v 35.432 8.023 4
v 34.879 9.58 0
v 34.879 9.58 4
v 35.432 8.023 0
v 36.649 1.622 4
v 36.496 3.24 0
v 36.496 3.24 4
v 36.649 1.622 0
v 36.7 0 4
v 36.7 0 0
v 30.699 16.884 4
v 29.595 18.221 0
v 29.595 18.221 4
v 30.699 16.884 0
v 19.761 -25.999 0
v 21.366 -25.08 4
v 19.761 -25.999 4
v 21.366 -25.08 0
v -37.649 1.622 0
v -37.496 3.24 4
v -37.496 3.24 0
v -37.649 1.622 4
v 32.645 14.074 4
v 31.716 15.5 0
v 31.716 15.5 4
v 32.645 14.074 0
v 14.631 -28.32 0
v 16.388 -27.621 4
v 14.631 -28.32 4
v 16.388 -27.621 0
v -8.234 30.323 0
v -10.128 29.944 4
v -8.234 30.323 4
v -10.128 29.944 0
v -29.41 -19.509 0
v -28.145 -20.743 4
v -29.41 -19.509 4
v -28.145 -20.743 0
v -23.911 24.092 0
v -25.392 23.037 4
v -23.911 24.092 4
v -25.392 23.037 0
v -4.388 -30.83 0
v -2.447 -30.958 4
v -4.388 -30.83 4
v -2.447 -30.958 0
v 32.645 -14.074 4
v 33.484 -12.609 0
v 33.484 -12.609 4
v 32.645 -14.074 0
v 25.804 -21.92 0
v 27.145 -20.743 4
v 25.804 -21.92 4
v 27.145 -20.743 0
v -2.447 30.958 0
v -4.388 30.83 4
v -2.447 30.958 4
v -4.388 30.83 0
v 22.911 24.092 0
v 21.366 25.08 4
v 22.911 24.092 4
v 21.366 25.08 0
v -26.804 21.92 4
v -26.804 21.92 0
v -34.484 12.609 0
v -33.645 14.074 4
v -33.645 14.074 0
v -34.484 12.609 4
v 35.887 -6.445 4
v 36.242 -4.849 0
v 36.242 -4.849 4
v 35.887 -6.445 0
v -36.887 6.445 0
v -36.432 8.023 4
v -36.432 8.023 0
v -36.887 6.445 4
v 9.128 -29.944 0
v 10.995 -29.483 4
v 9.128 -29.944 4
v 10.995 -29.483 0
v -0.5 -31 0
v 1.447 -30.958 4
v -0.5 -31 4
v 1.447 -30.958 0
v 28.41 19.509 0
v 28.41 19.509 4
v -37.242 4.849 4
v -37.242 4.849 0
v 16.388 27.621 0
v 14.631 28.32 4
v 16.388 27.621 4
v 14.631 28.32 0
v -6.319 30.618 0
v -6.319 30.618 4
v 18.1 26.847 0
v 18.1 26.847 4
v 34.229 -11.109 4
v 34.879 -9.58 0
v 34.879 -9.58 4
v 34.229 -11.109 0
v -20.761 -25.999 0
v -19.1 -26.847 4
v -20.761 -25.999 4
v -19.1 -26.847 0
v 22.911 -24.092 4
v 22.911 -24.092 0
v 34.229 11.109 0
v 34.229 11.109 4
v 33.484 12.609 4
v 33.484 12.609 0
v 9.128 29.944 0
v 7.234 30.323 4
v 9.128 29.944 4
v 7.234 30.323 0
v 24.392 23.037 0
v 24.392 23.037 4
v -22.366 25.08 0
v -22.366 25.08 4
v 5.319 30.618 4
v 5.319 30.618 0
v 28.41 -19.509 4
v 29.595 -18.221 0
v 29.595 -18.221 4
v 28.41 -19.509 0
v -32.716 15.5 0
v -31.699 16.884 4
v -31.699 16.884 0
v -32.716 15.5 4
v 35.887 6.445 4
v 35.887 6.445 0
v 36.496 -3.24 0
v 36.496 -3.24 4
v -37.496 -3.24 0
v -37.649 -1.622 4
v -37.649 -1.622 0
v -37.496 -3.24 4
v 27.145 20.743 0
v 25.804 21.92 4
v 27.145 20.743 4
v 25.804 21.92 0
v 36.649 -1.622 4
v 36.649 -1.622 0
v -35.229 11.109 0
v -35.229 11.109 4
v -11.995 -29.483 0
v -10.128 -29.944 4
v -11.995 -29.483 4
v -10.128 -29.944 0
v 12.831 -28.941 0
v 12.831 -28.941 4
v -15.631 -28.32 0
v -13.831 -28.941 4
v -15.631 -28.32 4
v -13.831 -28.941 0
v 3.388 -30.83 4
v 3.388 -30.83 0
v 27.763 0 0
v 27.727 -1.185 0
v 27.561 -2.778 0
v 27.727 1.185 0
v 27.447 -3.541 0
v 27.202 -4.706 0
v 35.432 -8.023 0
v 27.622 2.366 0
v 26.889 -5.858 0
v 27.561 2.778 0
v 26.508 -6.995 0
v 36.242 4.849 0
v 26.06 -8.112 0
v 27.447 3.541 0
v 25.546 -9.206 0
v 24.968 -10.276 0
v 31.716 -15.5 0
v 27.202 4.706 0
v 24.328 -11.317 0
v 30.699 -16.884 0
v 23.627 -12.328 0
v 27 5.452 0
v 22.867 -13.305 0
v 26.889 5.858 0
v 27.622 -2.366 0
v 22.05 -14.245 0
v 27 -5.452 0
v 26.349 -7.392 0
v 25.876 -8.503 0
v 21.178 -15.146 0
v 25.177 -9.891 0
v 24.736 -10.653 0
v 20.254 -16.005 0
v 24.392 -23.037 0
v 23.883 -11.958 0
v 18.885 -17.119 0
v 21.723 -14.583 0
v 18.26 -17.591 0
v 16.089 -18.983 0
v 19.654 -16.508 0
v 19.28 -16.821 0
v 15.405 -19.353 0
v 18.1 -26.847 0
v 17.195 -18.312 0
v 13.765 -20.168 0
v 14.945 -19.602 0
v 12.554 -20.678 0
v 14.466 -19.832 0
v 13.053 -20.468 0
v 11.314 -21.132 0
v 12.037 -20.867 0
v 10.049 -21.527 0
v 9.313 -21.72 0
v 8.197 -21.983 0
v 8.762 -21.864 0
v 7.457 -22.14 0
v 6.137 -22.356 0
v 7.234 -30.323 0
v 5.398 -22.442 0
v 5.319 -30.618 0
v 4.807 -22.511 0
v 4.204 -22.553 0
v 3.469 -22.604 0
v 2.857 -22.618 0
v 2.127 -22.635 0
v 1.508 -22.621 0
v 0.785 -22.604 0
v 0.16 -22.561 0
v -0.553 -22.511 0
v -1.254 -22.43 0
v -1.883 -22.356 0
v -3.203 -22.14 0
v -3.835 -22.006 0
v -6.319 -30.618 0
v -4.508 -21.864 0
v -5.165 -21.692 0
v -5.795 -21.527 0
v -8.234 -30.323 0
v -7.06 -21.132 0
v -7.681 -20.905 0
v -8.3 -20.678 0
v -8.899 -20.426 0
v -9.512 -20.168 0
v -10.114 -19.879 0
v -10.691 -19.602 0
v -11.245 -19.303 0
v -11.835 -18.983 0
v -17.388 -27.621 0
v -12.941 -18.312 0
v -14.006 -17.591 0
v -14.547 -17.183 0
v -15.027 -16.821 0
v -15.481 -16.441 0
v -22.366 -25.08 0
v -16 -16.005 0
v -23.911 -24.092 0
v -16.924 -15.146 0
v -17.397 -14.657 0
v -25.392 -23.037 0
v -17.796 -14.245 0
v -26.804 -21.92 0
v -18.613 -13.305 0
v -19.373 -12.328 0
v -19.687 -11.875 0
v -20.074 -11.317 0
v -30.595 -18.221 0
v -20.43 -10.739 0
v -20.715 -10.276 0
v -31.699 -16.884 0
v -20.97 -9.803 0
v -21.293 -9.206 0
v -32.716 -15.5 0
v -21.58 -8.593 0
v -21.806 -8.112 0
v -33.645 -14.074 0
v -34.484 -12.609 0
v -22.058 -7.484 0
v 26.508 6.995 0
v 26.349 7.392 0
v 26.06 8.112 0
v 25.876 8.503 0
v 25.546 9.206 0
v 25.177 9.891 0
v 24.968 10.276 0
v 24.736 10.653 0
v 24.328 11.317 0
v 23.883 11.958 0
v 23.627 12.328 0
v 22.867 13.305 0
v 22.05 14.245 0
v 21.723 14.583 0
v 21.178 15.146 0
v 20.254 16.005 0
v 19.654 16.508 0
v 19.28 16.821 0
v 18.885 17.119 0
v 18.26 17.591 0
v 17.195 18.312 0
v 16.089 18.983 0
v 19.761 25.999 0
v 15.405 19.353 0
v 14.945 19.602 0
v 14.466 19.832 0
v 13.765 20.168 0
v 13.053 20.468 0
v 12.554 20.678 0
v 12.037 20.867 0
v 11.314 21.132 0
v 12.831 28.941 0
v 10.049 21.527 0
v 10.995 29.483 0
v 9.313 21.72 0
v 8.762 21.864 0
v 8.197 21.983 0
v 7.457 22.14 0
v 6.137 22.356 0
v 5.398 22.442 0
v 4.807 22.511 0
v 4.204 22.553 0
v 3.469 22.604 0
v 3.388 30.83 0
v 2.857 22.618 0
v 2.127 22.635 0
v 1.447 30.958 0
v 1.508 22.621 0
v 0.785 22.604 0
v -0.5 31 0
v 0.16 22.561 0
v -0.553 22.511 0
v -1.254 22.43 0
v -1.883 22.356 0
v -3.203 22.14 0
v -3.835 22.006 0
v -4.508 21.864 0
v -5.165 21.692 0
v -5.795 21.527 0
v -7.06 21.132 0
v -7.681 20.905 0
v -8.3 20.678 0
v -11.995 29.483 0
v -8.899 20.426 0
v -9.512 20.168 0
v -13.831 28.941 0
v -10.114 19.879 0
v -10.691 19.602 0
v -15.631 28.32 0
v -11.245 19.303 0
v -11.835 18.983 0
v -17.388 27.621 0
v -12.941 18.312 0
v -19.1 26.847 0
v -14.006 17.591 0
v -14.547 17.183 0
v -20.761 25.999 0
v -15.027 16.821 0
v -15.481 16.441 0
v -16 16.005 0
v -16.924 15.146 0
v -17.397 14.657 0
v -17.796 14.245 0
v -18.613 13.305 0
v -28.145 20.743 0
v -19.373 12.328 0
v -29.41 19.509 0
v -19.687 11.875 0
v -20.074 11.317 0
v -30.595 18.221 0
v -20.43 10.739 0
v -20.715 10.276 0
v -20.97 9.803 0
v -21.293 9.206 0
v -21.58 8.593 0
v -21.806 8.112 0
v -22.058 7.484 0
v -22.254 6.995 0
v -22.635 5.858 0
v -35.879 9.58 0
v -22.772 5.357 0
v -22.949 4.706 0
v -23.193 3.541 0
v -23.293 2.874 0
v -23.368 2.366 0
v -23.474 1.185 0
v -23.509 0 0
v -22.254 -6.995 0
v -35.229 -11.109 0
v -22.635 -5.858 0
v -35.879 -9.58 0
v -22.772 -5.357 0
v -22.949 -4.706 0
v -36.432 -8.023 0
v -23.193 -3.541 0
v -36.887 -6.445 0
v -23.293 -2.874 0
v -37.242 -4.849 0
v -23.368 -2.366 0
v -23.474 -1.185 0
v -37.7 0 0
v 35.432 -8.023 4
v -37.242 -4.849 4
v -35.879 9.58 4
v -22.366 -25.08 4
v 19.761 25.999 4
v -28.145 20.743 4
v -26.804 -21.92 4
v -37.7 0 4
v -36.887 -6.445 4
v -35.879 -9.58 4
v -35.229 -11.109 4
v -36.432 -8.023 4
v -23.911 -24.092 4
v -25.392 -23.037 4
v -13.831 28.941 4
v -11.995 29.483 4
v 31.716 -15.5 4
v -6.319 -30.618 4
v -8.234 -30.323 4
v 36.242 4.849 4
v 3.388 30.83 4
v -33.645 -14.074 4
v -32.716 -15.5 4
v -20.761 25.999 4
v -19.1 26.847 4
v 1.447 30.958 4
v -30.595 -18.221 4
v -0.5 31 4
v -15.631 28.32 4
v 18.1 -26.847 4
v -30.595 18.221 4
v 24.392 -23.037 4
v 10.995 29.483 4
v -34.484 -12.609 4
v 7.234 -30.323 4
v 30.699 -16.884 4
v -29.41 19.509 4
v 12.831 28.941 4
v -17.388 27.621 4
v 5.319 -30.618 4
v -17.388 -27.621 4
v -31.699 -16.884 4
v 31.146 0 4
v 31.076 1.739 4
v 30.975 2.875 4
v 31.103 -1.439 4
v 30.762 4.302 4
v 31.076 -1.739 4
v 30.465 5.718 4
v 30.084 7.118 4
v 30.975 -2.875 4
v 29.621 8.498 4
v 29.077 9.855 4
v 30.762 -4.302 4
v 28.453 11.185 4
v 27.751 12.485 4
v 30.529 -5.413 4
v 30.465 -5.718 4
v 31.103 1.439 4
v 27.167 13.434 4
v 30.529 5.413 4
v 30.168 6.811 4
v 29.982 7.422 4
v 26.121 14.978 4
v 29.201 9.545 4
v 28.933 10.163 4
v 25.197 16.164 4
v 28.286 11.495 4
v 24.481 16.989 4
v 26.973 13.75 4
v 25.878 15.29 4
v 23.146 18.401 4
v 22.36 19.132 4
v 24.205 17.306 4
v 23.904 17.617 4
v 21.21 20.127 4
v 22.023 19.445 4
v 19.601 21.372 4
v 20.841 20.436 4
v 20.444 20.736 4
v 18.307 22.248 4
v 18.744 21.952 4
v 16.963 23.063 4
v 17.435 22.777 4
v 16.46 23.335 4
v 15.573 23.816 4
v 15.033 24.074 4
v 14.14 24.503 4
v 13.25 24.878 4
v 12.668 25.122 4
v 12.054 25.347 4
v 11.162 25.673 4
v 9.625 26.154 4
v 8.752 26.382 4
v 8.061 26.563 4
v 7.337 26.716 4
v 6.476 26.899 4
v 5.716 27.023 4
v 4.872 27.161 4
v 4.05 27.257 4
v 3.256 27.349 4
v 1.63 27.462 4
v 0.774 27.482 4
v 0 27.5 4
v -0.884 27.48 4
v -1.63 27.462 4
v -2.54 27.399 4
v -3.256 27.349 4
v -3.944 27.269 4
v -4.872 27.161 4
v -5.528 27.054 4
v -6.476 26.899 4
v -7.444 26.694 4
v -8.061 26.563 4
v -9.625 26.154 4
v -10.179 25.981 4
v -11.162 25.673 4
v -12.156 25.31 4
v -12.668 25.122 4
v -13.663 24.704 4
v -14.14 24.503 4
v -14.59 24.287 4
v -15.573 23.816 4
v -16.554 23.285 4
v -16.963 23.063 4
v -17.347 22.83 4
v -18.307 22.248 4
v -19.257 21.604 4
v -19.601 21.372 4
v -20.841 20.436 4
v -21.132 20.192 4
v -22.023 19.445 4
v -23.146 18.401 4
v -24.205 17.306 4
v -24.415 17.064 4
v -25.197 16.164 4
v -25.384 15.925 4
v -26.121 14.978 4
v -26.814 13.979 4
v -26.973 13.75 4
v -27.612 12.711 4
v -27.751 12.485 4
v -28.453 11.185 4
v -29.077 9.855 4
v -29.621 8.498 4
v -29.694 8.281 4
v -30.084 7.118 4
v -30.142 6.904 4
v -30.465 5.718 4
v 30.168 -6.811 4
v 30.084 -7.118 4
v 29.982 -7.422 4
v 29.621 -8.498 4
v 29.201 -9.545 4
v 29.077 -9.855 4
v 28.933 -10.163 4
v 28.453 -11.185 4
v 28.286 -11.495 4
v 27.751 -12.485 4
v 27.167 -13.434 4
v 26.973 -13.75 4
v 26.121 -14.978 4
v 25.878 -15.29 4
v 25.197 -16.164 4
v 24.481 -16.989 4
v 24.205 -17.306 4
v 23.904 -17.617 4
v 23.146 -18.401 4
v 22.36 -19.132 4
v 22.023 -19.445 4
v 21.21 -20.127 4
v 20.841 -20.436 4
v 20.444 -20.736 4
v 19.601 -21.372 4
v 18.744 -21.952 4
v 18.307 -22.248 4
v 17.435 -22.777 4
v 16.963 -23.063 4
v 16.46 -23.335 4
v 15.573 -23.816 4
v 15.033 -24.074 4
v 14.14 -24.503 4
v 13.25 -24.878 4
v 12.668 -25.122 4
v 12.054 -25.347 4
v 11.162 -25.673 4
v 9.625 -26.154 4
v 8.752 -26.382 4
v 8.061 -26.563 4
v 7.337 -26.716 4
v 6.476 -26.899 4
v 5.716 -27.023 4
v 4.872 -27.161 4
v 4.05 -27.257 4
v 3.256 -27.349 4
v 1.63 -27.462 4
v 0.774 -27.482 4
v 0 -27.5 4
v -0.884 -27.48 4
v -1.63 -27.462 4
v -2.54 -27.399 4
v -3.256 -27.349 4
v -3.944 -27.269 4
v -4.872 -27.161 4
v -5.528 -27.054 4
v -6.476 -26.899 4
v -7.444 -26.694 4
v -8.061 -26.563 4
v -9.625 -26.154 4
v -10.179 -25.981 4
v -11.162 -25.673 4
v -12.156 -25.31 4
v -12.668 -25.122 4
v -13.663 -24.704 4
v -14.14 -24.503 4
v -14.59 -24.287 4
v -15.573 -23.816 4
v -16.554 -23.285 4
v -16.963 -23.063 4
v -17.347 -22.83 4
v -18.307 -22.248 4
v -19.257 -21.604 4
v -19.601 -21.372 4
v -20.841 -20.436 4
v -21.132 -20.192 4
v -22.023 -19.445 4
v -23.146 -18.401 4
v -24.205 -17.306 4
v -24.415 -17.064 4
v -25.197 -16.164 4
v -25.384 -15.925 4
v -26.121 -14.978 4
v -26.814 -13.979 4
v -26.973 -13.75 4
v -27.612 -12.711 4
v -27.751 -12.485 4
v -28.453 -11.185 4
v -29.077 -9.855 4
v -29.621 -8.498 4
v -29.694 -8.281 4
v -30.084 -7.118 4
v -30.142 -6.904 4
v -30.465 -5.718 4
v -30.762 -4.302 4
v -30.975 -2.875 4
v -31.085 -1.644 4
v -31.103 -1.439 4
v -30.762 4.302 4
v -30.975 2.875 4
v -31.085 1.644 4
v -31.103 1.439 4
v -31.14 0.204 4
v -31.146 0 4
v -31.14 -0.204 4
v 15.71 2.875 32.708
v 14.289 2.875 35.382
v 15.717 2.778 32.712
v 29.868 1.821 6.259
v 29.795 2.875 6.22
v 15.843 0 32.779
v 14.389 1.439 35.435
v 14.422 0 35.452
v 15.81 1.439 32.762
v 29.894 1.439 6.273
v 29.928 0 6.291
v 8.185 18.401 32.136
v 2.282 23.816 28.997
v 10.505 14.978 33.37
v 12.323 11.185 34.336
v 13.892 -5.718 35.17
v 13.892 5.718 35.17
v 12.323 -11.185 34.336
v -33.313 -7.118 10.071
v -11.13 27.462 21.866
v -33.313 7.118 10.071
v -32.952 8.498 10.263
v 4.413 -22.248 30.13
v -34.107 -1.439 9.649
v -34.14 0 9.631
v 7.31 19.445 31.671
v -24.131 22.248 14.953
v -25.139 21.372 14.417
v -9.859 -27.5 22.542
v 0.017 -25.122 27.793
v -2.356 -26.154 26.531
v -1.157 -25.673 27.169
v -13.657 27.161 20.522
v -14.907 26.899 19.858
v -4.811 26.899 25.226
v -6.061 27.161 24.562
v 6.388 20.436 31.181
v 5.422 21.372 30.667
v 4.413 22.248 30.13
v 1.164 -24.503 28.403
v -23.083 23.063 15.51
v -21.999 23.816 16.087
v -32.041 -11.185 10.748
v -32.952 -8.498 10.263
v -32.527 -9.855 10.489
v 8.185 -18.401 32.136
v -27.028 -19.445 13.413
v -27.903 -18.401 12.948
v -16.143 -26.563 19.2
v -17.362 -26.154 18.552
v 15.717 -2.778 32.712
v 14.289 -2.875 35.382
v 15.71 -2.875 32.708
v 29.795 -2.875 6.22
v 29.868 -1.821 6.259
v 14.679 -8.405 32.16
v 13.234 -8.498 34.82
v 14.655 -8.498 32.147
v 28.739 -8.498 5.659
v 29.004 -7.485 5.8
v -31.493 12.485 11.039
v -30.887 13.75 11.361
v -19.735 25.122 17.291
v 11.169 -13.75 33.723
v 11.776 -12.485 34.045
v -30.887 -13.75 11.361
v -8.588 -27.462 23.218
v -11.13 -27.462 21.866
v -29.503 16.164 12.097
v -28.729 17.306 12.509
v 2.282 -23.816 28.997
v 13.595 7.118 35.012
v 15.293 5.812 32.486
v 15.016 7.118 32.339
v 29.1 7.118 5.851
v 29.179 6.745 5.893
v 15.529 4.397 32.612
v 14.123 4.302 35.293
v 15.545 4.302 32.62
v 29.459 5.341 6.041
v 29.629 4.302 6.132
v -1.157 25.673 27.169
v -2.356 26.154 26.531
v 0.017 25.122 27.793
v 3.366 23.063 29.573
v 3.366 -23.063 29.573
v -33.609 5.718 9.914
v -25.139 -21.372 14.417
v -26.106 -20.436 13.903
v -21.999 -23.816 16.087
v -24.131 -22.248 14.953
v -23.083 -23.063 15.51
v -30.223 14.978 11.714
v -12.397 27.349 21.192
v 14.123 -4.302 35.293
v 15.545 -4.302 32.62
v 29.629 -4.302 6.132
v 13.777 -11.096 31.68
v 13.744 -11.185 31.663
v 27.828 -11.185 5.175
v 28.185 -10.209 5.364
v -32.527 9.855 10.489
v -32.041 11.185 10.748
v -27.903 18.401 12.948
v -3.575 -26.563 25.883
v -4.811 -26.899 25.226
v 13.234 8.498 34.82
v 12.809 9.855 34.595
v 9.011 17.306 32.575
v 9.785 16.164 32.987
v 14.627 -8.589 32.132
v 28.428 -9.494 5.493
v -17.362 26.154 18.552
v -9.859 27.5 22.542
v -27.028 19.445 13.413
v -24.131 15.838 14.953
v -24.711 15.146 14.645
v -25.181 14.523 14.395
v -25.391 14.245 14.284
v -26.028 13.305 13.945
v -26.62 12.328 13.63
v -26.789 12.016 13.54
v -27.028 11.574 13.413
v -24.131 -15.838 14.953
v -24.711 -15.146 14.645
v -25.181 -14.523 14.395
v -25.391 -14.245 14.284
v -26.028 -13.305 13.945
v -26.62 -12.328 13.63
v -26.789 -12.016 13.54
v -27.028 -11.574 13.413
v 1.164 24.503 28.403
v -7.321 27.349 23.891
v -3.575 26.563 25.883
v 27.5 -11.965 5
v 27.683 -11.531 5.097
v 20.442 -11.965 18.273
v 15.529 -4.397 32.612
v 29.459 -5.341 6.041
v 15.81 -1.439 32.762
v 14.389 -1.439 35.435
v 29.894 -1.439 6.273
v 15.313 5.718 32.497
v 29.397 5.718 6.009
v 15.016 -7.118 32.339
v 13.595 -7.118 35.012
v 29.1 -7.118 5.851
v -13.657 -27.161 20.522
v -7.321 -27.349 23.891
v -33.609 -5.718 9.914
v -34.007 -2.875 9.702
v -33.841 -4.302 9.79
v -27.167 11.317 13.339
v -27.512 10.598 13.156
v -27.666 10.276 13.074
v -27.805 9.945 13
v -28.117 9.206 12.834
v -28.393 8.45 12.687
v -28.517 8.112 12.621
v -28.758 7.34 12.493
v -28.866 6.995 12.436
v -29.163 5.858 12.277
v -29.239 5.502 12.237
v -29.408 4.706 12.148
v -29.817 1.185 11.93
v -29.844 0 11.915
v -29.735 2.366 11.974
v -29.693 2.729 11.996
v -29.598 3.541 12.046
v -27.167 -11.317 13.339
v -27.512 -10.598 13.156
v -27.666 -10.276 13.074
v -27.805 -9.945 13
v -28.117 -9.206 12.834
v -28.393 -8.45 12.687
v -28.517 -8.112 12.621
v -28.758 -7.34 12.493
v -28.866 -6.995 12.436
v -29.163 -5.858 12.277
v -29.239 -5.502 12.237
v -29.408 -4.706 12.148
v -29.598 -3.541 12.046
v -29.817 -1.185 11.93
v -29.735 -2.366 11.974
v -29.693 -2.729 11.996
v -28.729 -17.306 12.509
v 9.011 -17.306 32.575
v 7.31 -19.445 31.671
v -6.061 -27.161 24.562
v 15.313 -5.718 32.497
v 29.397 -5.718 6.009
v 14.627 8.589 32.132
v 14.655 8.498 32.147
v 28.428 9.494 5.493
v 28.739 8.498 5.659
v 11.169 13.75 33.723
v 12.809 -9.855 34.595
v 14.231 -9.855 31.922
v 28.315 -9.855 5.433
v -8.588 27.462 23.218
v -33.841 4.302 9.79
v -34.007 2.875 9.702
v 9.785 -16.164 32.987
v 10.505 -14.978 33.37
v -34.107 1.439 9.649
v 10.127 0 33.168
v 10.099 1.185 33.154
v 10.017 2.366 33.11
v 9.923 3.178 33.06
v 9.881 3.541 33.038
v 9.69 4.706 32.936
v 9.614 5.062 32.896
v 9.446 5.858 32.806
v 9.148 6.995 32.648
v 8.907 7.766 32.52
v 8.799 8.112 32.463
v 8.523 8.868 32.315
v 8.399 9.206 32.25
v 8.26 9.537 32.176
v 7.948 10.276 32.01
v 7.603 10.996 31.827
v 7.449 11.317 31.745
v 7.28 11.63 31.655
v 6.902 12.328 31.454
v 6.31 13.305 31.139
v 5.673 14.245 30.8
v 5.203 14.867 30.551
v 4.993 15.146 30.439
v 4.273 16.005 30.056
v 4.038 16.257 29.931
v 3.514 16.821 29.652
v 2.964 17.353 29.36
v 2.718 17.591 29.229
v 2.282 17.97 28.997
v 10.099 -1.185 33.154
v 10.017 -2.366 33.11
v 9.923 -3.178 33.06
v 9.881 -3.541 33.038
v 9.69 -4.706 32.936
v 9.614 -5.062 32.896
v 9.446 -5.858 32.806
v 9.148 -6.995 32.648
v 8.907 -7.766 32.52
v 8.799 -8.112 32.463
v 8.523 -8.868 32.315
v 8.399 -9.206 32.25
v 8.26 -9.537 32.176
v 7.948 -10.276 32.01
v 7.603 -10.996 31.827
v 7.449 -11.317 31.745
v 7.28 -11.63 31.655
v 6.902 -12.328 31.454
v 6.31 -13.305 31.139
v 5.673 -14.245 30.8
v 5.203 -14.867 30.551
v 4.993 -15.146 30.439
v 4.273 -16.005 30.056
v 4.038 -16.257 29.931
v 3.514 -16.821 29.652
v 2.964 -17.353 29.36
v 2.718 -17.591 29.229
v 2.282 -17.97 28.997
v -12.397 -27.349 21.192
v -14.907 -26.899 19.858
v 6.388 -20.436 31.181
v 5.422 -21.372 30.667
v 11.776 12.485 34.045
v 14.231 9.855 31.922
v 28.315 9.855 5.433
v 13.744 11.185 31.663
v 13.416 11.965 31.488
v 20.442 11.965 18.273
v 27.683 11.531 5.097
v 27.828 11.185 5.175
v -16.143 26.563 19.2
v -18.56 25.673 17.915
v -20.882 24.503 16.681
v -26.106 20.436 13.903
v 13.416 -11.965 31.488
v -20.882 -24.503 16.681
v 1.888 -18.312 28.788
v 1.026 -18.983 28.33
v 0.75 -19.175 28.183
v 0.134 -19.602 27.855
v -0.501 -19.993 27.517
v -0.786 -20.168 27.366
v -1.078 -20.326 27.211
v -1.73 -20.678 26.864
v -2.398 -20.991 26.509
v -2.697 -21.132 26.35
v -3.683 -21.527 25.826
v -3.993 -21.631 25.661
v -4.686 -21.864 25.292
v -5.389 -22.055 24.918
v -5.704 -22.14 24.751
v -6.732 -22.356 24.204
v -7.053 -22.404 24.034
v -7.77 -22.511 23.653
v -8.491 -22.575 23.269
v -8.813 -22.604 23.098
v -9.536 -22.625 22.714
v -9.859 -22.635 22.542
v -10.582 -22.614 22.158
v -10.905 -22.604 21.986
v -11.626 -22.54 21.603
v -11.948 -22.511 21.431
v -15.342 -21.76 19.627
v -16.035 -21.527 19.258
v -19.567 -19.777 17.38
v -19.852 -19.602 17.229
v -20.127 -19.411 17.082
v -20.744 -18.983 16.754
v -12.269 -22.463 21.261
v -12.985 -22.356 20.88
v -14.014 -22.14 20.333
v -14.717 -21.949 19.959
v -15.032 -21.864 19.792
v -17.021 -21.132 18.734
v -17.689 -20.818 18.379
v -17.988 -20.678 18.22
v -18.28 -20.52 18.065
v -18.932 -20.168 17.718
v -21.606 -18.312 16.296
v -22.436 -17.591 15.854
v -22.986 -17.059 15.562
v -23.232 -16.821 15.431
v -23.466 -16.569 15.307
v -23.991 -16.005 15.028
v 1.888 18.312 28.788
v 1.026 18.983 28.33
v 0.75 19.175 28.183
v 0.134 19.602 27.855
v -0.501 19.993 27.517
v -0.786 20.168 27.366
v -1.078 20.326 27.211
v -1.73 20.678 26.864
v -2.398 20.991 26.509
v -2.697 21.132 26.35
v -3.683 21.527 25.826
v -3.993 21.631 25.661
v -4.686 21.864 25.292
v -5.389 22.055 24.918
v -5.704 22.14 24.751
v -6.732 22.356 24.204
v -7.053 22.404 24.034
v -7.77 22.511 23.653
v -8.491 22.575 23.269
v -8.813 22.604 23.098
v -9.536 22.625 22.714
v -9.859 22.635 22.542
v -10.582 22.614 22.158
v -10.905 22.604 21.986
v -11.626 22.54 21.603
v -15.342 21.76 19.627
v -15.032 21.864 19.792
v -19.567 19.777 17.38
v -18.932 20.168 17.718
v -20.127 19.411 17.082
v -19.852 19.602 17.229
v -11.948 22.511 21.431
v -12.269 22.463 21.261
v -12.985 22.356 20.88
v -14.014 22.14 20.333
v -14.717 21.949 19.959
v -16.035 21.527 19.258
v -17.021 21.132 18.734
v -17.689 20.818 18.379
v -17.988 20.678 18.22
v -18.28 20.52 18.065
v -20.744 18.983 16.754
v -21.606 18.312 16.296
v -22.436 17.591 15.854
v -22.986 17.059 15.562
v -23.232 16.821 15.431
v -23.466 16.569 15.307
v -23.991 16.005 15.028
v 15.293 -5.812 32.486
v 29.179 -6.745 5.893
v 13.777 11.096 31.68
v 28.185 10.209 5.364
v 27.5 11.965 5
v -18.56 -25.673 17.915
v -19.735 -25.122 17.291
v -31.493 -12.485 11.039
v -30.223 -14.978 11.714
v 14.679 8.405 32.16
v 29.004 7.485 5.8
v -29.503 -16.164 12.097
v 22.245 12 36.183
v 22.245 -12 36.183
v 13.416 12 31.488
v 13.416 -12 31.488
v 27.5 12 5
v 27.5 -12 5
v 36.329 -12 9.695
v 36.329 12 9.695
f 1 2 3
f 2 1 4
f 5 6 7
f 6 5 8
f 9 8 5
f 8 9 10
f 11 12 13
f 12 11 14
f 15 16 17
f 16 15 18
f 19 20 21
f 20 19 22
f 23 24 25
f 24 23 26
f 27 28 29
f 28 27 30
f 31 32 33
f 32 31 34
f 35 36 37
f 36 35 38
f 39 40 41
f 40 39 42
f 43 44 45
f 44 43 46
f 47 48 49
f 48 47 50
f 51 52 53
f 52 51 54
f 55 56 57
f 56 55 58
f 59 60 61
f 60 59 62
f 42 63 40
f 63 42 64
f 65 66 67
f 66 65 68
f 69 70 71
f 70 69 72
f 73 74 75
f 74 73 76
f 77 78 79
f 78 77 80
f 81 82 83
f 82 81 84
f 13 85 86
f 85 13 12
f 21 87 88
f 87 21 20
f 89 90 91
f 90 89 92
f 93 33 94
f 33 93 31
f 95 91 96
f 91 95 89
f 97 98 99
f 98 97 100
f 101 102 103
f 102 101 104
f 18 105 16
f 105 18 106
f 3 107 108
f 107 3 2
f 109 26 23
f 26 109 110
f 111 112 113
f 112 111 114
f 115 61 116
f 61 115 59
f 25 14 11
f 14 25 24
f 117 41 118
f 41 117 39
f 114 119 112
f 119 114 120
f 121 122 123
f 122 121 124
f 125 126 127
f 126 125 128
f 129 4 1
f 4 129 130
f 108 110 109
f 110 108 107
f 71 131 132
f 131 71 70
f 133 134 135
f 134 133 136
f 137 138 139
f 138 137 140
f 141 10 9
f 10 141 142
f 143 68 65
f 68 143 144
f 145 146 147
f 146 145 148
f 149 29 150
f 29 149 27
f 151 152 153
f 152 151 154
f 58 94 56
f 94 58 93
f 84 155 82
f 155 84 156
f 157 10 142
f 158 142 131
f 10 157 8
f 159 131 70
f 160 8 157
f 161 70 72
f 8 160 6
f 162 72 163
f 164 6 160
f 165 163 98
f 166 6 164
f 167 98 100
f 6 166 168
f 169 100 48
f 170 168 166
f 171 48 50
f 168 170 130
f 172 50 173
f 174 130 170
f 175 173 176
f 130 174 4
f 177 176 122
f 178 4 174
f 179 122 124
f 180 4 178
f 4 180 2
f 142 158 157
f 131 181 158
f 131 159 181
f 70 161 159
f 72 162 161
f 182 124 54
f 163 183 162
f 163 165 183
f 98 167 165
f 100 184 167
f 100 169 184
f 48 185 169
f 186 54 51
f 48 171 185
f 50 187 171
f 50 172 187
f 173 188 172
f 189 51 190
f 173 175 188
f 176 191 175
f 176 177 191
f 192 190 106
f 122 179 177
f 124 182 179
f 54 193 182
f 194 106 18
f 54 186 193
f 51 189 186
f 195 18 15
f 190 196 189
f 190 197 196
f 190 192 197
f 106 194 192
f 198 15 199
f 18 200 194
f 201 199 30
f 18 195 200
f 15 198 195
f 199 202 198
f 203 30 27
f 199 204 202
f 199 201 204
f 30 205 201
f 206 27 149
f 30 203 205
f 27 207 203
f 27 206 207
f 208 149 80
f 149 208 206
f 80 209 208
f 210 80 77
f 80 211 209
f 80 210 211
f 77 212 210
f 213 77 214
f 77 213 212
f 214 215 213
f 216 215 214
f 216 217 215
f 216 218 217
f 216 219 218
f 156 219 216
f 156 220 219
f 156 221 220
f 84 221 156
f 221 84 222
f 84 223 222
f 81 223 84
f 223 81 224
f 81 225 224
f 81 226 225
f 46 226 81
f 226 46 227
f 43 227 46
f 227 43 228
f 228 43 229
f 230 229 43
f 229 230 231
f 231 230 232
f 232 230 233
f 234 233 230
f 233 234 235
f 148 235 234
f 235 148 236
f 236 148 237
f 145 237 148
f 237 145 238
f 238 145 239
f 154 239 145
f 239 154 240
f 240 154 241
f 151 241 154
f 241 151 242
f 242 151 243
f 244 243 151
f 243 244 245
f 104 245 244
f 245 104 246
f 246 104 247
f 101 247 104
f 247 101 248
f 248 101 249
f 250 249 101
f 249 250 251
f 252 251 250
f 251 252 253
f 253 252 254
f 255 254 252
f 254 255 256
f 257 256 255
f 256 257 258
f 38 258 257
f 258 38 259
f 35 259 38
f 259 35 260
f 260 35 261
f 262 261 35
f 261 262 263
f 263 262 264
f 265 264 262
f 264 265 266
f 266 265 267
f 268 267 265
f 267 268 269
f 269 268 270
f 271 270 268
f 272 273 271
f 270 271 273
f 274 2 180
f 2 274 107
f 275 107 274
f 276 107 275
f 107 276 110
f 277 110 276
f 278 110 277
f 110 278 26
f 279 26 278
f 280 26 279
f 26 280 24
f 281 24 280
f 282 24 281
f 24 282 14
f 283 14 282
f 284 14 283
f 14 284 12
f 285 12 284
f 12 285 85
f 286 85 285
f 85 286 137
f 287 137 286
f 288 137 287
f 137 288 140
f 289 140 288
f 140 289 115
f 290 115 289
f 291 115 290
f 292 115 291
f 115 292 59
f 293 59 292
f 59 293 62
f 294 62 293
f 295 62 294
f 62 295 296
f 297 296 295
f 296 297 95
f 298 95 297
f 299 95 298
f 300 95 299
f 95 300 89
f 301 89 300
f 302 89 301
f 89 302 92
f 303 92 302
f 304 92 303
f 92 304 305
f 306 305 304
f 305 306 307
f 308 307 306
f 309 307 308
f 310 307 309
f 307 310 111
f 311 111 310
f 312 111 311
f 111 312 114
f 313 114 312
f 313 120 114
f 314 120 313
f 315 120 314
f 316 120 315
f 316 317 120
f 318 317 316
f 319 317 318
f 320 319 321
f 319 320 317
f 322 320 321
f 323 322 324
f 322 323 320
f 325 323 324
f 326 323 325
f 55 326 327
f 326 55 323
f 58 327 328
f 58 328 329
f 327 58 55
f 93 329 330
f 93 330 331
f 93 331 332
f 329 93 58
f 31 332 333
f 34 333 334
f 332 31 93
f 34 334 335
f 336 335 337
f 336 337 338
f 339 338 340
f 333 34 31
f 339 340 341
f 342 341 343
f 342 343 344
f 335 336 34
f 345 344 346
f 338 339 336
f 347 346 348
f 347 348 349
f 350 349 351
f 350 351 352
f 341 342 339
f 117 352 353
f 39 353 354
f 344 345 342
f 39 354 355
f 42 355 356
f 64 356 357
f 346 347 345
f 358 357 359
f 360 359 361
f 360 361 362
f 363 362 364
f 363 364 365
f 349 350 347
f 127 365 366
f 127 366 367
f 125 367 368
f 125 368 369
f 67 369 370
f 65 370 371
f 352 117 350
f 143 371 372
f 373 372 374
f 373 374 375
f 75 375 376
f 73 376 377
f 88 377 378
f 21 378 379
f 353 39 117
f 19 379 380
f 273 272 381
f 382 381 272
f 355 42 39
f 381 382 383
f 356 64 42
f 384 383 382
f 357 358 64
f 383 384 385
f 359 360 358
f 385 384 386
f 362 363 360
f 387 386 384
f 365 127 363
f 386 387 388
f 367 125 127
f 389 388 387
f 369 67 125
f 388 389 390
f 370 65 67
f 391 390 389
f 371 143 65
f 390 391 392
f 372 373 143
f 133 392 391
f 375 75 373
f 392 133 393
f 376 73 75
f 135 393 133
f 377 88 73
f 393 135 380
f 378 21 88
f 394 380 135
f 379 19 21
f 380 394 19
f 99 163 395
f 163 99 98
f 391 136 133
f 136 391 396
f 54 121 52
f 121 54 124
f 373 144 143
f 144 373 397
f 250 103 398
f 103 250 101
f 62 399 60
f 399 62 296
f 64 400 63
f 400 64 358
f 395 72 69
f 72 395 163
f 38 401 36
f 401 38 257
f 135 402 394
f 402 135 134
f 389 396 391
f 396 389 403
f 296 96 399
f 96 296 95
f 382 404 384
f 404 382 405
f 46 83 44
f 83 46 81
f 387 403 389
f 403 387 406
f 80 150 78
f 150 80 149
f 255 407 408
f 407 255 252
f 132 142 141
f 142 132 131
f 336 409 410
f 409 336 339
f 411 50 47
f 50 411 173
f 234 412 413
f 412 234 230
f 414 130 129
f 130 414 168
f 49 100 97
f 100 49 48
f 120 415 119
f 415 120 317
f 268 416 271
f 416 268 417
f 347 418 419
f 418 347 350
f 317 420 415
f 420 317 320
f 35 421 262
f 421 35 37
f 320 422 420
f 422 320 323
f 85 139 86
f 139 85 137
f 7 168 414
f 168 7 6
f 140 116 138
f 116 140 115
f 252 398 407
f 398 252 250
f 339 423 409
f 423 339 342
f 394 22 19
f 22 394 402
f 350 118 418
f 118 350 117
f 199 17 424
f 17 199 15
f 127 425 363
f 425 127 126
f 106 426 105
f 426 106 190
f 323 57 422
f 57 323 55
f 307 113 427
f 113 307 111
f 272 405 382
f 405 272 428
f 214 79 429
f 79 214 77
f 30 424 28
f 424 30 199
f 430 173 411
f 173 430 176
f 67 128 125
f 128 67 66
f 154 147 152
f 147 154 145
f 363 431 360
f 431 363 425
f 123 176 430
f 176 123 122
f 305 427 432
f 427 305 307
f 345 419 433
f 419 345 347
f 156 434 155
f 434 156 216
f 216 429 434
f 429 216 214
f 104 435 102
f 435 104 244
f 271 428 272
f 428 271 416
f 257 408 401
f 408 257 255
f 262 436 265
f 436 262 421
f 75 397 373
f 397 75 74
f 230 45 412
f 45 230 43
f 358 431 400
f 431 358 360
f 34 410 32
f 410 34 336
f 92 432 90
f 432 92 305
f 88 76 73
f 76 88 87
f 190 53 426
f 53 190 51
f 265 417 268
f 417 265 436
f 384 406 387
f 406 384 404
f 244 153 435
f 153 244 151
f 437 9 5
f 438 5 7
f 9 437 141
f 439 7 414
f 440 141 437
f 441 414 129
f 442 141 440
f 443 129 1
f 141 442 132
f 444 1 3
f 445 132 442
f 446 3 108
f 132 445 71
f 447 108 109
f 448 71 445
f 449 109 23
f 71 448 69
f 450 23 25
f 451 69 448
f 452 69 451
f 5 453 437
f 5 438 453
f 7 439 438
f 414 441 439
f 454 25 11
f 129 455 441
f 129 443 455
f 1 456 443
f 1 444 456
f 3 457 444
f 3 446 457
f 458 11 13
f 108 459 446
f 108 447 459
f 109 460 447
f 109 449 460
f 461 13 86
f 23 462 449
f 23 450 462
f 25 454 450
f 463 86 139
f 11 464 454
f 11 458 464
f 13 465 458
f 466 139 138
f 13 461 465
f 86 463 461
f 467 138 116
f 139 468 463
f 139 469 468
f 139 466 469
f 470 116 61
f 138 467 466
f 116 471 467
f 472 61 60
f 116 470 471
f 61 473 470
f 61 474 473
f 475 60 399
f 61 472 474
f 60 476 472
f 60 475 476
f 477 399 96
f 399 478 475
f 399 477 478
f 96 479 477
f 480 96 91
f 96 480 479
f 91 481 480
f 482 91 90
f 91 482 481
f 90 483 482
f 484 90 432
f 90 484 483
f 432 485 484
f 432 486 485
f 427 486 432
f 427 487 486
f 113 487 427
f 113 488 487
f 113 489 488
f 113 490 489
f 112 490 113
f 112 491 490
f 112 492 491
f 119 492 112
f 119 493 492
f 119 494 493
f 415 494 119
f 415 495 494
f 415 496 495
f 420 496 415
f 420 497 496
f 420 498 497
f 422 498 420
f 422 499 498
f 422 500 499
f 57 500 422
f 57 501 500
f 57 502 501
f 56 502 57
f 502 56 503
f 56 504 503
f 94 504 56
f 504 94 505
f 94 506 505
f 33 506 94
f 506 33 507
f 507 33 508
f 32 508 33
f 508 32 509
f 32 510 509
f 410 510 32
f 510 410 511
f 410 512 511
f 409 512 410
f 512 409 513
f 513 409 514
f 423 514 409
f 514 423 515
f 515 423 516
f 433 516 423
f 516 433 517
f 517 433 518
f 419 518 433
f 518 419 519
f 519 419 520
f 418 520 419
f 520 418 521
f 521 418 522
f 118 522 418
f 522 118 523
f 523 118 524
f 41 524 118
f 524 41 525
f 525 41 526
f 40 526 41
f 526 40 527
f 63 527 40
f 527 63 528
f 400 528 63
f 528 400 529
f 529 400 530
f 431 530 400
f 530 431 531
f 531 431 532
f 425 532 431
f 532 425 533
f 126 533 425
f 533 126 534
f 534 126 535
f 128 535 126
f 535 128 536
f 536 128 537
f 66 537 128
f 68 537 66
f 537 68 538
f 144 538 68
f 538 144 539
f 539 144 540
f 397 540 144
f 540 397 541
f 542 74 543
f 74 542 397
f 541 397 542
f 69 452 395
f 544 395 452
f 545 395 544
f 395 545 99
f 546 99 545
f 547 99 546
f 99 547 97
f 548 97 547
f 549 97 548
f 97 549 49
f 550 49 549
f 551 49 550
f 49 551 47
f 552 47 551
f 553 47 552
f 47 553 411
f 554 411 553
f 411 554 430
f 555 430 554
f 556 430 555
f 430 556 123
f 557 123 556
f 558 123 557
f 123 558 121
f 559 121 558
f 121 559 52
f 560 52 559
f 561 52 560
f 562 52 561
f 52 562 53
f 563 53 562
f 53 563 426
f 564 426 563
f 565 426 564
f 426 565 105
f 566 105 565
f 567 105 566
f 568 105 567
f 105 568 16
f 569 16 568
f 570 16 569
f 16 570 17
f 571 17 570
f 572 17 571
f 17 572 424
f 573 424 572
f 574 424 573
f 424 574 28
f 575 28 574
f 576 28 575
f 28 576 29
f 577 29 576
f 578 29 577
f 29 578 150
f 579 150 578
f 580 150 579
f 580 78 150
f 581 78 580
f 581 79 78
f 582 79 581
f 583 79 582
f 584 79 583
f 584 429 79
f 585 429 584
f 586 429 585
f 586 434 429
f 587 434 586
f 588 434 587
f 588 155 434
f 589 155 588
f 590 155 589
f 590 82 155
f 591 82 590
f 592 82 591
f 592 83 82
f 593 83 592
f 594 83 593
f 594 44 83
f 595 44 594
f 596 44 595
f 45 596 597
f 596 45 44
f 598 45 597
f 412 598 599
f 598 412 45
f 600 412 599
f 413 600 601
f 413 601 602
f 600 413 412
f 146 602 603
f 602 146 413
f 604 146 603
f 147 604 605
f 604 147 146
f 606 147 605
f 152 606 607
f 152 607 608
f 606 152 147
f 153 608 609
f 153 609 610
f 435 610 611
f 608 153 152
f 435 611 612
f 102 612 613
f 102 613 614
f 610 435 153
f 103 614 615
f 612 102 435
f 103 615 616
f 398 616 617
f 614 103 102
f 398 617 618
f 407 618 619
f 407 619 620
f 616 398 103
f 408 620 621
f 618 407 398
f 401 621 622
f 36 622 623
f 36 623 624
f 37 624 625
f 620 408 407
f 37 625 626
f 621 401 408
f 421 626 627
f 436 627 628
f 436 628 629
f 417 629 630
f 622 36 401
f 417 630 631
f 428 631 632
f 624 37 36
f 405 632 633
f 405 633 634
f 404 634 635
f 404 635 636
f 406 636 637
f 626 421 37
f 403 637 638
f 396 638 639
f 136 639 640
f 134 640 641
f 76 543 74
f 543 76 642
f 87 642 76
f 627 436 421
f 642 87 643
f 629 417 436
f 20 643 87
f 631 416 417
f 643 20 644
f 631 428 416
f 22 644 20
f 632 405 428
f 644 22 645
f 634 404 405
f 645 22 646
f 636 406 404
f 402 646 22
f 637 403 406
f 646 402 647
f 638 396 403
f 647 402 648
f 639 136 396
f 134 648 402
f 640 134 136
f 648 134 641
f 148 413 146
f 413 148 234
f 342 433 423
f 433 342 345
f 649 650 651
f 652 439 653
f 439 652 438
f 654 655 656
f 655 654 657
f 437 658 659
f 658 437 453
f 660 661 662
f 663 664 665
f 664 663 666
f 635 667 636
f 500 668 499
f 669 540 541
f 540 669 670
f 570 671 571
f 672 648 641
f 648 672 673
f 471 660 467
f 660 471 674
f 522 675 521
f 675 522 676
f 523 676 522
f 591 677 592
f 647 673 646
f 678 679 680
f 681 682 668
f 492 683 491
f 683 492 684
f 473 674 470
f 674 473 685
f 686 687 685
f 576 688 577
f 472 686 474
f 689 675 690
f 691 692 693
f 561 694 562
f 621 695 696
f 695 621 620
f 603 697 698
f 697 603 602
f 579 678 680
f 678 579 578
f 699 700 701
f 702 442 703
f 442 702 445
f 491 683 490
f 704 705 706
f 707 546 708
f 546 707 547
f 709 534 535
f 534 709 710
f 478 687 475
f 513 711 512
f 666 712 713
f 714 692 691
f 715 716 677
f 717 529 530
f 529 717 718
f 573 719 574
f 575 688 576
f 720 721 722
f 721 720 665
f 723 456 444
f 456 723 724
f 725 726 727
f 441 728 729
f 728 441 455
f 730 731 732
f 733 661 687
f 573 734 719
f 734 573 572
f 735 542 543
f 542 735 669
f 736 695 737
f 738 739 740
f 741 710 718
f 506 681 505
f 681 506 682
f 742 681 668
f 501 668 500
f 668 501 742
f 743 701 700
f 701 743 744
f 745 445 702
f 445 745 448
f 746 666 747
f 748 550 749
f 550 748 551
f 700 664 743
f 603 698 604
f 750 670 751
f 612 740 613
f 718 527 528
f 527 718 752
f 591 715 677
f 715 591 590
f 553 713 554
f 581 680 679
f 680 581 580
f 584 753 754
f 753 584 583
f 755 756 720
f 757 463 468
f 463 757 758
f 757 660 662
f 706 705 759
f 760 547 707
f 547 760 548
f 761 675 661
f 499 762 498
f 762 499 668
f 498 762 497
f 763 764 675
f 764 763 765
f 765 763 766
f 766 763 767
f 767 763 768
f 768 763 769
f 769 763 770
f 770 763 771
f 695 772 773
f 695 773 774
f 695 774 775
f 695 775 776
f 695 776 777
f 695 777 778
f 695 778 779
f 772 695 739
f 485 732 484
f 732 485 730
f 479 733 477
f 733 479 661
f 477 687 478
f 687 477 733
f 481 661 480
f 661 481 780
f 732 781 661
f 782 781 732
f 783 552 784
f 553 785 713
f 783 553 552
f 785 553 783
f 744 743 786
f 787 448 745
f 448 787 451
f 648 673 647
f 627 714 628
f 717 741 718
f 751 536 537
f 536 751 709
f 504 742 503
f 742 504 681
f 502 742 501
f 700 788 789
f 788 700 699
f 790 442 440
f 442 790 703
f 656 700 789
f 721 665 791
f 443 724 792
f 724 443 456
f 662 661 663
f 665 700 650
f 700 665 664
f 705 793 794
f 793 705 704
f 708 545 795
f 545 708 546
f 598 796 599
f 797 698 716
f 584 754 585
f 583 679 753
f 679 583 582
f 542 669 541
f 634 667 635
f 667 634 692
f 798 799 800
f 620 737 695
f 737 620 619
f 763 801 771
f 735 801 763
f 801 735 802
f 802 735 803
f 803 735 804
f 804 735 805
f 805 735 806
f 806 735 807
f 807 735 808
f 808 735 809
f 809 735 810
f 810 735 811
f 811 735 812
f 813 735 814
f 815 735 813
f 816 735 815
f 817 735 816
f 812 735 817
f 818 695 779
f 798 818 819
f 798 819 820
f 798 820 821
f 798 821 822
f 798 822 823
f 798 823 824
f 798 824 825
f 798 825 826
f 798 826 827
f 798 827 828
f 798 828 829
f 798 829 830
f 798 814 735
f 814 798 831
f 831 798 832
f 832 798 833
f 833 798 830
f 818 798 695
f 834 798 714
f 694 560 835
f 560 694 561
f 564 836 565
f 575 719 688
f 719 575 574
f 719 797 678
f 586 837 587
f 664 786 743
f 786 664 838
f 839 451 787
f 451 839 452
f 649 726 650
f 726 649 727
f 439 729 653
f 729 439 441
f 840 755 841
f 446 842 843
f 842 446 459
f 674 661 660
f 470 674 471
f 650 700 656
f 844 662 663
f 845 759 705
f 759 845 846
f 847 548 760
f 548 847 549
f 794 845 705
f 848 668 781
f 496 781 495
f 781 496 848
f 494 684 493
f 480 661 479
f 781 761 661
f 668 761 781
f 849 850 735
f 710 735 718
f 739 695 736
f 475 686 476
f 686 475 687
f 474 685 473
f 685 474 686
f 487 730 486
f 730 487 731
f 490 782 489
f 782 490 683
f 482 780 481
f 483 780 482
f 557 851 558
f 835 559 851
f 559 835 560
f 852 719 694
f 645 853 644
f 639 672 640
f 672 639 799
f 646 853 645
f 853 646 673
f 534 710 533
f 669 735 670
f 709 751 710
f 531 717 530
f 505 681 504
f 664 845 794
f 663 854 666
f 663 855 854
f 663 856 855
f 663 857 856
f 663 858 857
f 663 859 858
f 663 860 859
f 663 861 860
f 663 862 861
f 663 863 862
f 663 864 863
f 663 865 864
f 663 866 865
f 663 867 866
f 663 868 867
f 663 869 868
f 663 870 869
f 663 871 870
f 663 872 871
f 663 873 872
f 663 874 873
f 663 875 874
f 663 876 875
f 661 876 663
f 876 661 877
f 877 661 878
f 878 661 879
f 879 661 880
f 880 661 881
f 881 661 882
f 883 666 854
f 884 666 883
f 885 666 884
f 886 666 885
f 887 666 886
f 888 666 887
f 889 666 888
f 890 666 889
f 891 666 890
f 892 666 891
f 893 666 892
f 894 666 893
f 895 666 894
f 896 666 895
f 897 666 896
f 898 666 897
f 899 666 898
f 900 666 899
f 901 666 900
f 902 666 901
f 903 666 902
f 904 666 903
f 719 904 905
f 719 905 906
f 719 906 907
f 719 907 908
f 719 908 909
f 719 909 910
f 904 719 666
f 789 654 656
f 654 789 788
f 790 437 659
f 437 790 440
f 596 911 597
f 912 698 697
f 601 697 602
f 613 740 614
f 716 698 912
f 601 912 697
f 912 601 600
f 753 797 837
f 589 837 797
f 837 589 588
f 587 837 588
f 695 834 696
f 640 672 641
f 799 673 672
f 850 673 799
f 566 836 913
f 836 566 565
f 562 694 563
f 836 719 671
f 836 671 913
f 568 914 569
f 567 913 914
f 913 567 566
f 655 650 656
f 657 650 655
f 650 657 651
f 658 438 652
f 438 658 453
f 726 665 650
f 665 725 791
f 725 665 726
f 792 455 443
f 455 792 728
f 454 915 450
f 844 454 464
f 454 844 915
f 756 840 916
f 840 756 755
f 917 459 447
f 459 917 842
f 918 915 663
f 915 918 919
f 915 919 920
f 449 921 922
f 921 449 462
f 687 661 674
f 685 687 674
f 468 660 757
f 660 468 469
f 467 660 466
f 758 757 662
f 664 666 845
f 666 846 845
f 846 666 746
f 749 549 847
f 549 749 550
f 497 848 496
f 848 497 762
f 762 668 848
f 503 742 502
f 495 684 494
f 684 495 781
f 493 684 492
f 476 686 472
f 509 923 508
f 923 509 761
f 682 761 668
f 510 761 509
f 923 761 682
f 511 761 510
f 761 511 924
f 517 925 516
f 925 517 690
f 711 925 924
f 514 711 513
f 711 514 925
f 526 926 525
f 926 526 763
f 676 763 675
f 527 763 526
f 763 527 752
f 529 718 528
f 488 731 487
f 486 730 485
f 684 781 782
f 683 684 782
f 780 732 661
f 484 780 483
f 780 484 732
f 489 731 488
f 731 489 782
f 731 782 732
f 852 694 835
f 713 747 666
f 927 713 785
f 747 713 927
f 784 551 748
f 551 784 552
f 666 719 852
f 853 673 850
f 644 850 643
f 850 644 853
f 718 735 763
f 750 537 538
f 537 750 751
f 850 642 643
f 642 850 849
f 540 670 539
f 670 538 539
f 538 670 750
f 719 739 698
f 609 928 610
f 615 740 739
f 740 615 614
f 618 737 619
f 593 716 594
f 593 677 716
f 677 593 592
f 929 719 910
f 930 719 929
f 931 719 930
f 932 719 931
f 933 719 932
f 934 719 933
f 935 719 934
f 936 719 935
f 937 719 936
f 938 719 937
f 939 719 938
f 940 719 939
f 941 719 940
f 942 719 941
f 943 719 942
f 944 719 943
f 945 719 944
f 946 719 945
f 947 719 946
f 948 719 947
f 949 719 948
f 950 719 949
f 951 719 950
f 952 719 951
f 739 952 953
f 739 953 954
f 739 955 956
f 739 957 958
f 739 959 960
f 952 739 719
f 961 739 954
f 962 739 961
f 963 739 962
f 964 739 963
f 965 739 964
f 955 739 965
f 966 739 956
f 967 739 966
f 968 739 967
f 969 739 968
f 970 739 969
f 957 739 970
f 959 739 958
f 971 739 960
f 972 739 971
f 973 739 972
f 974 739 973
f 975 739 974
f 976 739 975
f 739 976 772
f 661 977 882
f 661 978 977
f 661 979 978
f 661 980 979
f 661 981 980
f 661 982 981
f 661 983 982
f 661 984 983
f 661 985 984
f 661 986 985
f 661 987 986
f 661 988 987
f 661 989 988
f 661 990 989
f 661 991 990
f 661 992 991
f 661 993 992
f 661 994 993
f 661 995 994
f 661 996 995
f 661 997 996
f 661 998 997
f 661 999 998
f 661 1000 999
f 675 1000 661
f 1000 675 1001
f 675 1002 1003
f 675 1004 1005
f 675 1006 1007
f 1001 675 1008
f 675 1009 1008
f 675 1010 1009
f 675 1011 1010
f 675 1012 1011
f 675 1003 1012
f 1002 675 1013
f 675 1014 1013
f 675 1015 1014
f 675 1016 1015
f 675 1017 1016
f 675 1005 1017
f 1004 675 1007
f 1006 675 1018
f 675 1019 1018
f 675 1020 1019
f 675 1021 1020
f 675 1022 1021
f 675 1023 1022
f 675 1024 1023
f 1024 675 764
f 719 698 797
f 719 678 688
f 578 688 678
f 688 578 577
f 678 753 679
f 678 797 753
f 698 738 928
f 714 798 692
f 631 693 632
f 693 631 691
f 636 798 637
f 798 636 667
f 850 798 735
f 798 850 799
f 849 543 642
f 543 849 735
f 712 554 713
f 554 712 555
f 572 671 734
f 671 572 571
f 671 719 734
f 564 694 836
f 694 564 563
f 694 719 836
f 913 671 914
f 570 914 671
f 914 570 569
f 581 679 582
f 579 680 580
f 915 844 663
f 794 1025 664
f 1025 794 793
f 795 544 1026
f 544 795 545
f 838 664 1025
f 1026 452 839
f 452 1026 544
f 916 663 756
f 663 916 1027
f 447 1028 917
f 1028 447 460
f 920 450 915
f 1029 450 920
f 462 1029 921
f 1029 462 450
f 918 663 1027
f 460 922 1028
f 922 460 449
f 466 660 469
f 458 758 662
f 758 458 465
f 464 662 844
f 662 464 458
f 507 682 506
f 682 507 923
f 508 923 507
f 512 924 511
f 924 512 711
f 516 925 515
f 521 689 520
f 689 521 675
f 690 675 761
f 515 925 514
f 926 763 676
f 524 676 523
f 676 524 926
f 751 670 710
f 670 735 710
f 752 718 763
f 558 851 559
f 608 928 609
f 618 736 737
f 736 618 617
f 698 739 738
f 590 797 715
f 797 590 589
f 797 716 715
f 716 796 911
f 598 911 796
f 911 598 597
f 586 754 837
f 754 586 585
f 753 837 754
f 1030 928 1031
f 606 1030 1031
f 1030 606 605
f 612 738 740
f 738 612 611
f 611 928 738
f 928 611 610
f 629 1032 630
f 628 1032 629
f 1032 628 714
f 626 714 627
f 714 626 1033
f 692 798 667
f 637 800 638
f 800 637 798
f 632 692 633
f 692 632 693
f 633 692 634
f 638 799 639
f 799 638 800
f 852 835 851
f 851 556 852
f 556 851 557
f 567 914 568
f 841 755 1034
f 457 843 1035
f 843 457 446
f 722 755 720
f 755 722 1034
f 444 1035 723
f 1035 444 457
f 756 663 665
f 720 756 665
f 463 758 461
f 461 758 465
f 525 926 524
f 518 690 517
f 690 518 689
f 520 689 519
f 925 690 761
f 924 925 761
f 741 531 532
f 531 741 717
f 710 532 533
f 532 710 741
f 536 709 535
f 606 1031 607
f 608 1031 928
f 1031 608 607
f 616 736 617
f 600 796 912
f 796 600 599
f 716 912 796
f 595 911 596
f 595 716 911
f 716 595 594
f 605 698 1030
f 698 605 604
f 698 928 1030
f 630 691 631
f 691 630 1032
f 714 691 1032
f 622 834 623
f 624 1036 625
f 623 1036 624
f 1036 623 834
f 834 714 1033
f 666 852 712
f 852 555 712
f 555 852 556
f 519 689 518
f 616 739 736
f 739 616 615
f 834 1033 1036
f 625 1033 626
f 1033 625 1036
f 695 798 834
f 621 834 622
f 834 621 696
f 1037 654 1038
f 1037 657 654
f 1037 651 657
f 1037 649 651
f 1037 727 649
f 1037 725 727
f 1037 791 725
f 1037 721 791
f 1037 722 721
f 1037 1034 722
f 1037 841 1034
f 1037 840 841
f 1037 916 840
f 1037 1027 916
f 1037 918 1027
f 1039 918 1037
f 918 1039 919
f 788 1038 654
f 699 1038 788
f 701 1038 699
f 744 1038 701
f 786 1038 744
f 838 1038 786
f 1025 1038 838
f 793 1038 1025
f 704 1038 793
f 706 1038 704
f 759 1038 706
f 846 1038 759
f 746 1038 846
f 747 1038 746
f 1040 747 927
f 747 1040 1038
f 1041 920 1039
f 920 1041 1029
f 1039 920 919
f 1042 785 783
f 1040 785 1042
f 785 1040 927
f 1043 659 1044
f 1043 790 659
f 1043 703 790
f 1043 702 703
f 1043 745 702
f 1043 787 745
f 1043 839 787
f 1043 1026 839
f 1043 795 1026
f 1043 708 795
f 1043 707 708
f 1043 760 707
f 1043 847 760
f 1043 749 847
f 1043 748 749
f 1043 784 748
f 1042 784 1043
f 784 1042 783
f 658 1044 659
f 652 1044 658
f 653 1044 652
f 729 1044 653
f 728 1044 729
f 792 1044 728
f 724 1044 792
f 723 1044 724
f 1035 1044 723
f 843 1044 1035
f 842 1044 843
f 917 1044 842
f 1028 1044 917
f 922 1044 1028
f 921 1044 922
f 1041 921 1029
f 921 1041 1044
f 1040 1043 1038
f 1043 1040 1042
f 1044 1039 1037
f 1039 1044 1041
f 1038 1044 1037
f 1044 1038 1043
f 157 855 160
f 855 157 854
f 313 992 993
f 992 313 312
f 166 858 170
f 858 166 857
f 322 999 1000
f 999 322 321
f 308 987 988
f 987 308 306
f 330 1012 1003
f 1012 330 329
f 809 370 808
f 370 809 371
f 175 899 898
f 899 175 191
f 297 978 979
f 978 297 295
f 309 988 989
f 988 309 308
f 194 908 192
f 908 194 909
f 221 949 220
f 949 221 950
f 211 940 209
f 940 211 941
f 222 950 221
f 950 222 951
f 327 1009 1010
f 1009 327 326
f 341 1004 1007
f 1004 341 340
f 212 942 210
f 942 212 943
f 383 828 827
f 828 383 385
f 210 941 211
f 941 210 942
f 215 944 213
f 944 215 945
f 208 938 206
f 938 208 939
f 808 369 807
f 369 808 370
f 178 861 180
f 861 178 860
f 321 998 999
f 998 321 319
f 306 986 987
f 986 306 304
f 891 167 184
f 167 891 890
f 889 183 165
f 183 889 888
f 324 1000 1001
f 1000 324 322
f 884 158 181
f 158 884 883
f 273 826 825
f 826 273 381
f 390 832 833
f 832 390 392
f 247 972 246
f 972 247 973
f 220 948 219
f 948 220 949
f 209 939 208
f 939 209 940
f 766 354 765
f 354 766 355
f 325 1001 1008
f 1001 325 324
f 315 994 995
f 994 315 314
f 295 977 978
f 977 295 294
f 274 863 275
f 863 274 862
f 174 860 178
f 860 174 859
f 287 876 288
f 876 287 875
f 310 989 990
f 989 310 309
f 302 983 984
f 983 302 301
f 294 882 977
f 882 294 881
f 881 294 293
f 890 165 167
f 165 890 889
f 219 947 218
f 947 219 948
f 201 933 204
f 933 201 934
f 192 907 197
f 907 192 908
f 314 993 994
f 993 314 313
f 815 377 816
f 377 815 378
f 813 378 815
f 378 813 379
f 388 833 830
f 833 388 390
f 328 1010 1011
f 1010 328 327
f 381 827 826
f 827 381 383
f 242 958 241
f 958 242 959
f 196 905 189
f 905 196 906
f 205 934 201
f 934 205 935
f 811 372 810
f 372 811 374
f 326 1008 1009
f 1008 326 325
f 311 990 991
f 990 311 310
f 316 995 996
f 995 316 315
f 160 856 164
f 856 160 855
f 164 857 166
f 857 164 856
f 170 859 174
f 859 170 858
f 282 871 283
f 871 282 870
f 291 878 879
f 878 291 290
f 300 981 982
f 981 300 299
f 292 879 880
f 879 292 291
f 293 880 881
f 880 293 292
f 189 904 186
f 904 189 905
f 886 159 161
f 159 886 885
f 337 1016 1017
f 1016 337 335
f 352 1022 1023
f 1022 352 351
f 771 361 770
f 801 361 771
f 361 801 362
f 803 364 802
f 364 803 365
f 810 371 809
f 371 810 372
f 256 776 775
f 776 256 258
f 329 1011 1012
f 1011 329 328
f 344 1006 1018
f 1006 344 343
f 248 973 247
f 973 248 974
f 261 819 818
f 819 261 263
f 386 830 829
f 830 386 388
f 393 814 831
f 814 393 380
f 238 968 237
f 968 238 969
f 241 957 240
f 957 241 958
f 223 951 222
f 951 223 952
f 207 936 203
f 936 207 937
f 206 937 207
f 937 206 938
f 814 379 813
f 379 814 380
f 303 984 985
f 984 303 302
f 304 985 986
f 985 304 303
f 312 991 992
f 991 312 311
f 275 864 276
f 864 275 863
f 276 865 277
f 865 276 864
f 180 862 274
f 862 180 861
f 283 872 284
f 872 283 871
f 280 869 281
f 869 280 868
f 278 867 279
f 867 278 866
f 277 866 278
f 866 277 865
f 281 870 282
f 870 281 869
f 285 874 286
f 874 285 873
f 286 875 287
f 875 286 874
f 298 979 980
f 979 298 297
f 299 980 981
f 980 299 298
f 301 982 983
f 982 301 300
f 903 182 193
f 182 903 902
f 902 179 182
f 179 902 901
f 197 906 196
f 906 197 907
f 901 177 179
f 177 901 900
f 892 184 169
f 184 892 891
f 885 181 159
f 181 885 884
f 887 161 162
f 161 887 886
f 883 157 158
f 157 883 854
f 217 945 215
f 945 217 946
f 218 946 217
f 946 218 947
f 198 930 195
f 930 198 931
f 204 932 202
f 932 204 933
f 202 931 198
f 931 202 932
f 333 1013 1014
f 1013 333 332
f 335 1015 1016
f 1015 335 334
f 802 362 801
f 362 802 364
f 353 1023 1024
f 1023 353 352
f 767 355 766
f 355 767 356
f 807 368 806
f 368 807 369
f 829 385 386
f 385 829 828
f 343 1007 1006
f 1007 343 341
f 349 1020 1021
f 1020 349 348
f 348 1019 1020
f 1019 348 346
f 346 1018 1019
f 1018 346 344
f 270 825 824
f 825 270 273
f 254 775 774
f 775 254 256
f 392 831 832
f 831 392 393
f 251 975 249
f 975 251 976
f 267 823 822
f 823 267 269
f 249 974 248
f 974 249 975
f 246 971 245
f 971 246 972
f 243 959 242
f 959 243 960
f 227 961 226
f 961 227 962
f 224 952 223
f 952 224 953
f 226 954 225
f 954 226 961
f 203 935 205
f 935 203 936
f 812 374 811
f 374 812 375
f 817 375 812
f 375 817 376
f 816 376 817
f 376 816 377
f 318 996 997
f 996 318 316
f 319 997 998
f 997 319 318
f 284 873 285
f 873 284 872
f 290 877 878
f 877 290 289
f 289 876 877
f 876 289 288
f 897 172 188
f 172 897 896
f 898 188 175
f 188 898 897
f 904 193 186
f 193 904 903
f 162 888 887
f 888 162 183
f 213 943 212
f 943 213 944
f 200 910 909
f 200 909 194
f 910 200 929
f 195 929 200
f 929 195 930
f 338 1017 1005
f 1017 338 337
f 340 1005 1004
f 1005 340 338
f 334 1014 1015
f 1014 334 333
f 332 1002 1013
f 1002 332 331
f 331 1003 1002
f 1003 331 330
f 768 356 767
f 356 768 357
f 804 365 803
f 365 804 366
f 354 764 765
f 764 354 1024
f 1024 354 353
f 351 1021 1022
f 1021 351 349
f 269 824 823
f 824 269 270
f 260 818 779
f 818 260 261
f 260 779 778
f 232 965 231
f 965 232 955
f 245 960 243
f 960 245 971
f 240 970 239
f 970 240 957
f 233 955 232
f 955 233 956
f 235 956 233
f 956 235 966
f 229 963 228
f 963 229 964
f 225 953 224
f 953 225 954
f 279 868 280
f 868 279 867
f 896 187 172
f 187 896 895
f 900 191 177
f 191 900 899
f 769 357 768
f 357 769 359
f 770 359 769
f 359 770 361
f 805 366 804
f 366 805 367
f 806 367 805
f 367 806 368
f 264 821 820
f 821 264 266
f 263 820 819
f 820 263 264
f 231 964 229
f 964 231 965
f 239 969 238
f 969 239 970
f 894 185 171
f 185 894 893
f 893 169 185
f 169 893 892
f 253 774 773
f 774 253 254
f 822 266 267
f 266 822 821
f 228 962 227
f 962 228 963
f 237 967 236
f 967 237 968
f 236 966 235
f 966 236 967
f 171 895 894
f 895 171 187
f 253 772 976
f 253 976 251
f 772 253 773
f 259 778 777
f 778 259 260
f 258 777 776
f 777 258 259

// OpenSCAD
// Recreating the angled mount from image_a1eebf.png

$fn = 120; // High resolution for smooth curves



// --- Known Dimensions ---

inner_radius = 22.635; // From cyan measurement[cite: 1]



// --- Estimated Dimensions (Adjust as needed) ---

outer_radius = 27.5;     // Thickness of the main angled walls

base_radius = 31;      // Flange at the bottom

base_height = 4;       // Thickness of the bottom flange

tilt_angle = -28;      // Angle of the main cylindrical body

mount_height = 45;     // Total length of the angled cylinder

cutout_depth = 100;     // How deep the inner pocket goes



// --- Base Flange Adjustments ---

base_x_stretch = 1.2; // Stretches the base along the X-axis to match the tilt footprint

base_x_offset = -0.5;    // Shifts the base along the X-axis to center it under the lean



difference() {

    // 1. MAIN SOLID BODY (What we keep)

    union() {

        // Flat base flange (Stretched and shifted to fit the angled cylinder)

        translate([base_x_offset, 0, 0])

            scale([base_x_stretch, 1, 1])

                cylinder(r=base_radius, h=base_height);

        

        // Main angled cylindrical body

        translate([0, 0, base_height])

            rotate([0, tilt_angle, 0])

                translate([0,0,-20-base_height])

                    cylinder(r=outer_radius, h=mount_height);

                

        // Rectangular protrusion on the back left

        translate([outer_radius, -12, 5])

        rotate([0, tilt_angle, 0])

            cube([10, 24, 30]);

    }



    // 2. SUBTRACTIONS (What we cut away)

    

    // The main inner cylindrical cutout (cyan highlight)

    translate([0, 0, base_height])

        rotate([0, tilt_angle, 0])

            // Shift up along the angled Z-axis to leave a solid bottom

            translate([0, 0, mount_height - cutout_depth])

                cylinder(r=inner_radius, h=cutout_depth + 10); // +10 ensures a clean cut through the top

                

    // Clean-up cut: Flatten the bottom to ensure no angled geometry dips below Z=0

    translate([0, 0, -50])

        cube(100, center=true);

} 
